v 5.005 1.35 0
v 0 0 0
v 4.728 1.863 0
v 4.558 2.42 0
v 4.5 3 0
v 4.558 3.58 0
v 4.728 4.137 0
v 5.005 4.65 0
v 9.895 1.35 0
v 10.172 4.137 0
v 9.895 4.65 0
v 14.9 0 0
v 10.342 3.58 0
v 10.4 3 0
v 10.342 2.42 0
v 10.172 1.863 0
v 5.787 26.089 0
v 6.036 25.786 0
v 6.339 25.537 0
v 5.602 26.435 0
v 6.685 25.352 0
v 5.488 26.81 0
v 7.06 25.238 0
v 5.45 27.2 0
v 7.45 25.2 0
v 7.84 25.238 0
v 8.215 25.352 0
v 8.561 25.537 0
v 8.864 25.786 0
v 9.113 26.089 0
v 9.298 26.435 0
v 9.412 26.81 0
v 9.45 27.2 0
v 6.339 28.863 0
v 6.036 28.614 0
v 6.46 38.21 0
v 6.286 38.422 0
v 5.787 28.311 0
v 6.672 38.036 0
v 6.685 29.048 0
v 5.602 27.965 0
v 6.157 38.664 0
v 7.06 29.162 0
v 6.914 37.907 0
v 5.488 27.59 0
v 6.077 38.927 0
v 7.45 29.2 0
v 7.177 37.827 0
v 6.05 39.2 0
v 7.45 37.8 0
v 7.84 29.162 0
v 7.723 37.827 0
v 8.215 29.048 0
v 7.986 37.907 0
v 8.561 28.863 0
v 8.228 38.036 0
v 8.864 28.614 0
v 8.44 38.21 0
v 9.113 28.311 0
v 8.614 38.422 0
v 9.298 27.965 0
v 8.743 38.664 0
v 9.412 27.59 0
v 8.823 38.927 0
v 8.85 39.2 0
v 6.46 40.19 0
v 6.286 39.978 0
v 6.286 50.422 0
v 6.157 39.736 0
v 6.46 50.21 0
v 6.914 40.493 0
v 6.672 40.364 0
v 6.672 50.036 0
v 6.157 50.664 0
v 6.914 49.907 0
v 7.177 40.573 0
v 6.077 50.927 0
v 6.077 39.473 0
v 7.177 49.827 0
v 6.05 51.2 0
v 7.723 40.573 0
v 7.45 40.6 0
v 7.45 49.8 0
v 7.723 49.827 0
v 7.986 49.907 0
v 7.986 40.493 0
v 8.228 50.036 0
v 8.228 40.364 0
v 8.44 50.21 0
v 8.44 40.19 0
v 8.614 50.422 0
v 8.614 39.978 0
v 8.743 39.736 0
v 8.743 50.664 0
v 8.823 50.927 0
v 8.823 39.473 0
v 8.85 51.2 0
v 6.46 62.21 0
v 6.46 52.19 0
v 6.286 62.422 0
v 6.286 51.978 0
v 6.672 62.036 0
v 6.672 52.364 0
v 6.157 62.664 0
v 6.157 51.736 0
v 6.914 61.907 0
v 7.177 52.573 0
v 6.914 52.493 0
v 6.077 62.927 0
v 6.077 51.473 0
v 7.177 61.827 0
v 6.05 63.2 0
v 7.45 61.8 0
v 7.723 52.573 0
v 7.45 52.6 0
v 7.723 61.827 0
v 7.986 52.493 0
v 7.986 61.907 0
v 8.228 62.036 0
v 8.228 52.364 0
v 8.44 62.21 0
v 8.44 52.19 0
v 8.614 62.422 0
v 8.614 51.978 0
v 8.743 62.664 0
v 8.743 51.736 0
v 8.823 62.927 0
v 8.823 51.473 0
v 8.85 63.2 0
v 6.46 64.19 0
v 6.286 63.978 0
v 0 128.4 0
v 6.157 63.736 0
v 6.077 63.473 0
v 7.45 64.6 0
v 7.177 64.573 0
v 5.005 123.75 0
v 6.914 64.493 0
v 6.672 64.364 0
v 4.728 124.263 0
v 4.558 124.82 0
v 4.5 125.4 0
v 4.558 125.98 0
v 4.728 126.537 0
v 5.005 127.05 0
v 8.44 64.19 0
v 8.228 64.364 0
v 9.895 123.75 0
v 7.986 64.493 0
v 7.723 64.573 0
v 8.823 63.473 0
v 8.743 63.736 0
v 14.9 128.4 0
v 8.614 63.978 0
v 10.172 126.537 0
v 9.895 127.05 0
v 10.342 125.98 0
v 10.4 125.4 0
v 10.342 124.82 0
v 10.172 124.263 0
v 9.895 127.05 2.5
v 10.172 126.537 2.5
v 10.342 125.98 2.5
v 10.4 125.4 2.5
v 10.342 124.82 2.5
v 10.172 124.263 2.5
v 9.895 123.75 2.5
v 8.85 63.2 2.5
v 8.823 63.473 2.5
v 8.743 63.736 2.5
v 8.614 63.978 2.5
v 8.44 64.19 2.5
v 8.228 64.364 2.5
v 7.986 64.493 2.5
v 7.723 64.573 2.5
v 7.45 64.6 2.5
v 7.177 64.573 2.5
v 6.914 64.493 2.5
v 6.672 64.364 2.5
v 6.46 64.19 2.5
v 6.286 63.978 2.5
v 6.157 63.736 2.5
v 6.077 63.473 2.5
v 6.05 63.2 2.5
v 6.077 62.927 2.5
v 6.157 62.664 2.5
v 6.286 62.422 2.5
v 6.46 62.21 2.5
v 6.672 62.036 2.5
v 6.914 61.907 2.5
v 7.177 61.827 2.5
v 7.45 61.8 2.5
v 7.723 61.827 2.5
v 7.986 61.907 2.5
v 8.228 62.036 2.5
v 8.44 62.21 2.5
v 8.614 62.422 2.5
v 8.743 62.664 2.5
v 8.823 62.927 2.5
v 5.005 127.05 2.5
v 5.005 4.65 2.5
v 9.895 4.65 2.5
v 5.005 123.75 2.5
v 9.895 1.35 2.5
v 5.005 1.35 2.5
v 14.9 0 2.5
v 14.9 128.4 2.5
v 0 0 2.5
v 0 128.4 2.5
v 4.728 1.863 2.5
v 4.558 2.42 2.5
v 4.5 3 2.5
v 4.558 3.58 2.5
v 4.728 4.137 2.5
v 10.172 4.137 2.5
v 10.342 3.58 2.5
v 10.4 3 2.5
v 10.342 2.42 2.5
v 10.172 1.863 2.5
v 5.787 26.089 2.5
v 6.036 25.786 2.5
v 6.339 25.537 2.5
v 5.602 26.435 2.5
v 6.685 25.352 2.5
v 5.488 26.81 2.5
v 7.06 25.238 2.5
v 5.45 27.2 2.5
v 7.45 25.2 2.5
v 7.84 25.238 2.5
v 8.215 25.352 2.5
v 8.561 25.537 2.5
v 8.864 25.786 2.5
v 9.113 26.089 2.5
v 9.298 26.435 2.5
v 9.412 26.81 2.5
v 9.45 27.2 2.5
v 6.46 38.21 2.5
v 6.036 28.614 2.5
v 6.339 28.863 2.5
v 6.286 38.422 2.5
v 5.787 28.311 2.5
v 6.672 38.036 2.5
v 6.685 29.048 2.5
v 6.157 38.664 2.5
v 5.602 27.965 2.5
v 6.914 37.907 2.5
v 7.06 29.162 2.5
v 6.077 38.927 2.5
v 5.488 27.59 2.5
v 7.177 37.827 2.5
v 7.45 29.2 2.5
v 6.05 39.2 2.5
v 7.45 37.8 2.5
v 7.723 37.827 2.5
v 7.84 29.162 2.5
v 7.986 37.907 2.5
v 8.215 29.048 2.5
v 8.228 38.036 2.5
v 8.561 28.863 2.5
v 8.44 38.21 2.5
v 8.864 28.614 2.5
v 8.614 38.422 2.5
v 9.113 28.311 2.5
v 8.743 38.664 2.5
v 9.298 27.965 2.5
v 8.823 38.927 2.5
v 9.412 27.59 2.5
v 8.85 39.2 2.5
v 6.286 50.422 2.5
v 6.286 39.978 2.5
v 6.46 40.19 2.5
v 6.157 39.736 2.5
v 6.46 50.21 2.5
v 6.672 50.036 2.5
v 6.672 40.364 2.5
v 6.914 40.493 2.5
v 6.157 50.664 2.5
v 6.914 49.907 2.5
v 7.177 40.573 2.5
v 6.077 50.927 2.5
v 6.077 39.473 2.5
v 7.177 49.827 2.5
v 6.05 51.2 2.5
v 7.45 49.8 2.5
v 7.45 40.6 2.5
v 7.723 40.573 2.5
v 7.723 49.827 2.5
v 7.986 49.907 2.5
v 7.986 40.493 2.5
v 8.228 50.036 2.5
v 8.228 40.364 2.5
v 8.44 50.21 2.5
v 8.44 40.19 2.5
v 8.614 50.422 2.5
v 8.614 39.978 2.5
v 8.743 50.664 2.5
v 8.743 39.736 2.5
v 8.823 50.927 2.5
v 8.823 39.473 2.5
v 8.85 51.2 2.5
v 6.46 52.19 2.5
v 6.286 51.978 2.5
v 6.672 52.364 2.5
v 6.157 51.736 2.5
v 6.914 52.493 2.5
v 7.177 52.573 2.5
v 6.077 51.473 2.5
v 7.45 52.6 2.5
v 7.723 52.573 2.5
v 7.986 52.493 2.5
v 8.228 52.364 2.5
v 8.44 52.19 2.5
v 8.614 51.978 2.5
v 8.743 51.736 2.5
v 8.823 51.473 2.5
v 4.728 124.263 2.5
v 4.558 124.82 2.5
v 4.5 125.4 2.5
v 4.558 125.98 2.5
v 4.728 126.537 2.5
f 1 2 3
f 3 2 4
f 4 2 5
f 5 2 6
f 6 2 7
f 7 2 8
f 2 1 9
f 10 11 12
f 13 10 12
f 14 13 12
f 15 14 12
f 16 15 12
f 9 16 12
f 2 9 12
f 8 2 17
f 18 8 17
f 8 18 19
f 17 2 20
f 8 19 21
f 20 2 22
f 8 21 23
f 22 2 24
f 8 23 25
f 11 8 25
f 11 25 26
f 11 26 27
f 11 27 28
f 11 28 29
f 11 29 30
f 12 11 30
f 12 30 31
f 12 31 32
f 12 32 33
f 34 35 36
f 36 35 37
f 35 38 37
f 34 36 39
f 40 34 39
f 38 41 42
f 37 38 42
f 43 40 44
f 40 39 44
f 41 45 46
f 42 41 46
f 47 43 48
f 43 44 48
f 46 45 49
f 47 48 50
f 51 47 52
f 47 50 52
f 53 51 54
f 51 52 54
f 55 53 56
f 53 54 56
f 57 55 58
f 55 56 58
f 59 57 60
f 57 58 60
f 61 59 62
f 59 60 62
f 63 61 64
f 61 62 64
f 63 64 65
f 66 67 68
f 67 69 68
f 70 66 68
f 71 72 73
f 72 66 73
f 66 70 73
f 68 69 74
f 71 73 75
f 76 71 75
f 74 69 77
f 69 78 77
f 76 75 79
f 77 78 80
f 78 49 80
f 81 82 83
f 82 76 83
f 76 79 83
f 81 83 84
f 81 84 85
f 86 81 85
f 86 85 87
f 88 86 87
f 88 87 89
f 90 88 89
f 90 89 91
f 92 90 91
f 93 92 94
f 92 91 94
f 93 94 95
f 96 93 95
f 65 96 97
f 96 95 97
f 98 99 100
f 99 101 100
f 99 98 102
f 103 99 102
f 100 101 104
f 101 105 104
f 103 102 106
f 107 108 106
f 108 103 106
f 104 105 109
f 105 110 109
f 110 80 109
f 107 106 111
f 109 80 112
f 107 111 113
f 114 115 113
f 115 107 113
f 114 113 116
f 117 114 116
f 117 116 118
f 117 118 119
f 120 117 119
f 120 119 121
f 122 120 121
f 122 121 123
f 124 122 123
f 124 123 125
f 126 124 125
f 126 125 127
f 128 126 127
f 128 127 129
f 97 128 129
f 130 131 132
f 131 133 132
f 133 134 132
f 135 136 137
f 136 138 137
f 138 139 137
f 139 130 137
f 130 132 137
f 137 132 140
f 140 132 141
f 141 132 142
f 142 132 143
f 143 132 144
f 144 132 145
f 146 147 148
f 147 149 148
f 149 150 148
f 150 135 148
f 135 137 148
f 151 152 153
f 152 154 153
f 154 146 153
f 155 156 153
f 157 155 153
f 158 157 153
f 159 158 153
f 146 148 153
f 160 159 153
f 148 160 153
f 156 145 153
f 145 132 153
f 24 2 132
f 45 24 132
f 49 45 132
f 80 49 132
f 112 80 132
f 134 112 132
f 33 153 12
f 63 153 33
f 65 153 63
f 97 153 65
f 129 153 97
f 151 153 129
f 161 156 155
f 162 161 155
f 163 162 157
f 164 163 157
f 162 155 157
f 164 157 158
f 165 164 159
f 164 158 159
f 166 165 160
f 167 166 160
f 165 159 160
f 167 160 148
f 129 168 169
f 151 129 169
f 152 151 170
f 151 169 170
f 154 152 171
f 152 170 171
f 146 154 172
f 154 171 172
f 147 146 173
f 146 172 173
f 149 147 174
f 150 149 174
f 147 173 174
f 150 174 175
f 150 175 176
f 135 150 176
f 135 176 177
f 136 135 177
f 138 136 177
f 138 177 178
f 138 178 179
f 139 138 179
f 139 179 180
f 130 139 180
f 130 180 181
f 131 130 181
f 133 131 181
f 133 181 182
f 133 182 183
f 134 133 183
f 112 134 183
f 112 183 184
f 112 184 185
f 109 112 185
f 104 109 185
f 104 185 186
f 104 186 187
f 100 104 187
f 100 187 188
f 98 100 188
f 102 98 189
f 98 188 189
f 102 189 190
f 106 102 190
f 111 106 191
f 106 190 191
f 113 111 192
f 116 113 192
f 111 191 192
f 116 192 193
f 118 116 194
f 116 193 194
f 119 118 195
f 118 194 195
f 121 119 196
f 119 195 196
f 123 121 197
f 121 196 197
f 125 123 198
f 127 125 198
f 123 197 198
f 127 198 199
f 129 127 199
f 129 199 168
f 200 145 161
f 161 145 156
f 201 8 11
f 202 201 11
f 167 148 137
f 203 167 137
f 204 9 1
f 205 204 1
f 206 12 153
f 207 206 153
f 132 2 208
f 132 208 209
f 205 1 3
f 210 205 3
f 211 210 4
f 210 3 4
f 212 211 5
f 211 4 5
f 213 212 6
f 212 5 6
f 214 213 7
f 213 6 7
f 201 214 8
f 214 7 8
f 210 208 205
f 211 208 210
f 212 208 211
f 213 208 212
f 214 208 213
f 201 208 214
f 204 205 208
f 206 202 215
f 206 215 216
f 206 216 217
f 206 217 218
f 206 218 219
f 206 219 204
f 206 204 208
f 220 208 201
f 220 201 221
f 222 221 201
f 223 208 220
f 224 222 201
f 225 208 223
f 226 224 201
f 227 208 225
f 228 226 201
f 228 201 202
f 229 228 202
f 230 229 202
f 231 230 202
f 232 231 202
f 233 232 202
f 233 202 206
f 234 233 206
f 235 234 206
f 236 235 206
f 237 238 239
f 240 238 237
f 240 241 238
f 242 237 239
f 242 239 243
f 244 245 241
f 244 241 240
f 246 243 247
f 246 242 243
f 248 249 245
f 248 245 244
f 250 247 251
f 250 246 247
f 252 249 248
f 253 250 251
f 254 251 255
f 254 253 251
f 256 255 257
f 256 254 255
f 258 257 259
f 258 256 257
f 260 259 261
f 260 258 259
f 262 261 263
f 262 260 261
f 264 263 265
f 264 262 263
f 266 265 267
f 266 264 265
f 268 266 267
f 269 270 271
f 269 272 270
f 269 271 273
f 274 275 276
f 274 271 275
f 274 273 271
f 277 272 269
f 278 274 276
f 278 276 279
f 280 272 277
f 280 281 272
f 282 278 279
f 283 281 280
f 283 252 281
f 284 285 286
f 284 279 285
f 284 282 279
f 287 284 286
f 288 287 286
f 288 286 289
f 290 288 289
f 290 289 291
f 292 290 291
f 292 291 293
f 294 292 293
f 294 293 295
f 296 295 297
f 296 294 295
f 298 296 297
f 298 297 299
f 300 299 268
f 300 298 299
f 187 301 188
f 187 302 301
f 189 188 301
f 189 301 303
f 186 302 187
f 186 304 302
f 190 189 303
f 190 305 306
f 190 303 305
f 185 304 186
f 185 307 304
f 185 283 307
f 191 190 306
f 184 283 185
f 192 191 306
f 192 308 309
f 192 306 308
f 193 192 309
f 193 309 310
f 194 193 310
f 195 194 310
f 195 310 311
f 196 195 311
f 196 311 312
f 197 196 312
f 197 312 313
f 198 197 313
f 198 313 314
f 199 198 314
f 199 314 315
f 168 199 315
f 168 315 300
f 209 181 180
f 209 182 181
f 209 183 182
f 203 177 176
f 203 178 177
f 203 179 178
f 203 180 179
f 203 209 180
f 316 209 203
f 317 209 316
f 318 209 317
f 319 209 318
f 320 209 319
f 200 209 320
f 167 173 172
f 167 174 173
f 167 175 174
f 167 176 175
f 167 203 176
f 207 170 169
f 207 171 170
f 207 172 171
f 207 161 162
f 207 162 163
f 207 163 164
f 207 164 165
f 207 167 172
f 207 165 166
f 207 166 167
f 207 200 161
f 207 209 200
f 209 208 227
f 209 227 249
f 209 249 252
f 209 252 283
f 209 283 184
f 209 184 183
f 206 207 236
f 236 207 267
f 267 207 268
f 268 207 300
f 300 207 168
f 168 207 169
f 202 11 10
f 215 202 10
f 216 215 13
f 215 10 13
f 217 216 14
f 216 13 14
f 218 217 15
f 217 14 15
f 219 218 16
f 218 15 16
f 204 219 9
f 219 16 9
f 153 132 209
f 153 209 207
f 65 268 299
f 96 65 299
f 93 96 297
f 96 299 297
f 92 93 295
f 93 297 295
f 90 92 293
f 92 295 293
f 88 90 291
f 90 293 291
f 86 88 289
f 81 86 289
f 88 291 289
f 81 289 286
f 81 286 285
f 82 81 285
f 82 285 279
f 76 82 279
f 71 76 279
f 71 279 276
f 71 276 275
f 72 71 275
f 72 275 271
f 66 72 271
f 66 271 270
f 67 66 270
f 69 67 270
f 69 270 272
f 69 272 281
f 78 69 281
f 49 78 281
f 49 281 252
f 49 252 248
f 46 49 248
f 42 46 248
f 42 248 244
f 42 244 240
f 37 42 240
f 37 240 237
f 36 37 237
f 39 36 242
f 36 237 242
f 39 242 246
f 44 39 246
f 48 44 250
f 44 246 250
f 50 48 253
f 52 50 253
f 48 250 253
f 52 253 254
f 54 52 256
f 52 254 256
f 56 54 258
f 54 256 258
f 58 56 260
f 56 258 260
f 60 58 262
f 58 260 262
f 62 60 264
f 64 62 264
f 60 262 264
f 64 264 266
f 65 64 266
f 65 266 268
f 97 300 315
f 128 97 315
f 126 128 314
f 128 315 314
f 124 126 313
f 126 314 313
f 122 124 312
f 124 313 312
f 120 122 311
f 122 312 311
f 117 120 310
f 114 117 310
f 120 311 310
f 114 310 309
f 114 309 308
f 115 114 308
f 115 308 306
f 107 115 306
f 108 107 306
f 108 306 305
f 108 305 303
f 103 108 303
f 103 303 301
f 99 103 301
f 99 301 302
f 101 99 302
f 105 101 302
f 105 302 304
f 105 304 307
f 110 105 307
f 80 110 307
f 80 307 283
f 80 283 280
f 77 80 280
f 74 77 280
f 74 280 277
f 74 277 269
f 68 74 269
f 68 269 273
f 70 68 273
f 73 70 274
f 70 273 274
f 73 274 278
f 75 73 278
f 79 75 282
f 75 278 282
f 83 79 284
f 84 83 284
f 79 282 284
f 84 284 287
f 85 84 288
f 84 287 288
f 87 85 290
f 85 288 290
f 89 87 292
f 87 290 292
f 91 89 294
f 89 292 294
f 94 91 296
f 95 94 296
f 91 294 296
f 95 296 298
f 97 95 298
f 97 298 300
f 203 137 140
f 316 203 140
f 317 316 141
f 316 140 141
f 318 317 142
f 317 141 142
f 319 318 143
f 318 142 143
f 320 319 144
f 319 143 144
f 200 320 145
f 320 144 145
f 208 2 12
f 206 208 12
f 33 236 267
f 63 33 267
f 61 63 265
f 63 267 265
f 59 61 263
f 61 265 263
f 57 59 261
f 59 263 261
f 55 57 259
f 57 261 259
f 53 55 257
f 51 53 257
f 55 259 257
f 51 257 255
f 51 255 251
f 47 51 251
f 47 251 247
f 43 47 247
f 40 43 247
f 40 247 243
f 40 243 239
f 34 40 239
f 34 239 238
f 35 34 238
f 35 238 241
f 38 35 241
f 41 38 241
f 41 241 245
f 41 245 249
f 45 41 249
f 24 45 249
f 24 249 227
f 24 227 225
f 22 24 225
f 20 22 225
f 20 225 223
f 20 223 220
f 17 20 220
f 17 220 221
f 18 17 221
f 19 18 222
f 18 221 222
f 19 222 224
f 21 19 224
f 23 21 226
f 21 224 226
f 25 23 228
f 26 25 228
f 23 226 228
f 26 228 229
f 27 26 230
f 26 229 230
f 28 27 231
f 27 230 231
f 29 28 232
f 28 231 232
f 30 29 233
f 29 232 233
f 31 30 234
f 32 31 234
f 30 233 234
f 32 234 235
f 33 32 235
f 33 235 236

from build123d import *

# Parameters (mm, degrees)
MODEL_W                 = 14.9
MODEL_H                 = 128.4
BOSS_EXTRU_1_DEPTH      = 2.5
ESQUISSE1_R             = 1.4
ESQUISSE1_R_2           = 2
ENL_V_MAT_EXTRU_1_DEPTH = 130.285807419


with BuildPart() as part:
    # Model → Boss.-Extru.1 (new body)
    with BuildSketch(Plane.XY):
        with Locations((7.45, 64.2)):
            Rectangle(MODEL_W, MODEL_H)
        with BuildLine():
            Line((9.895403852, 123.75), (5.004596148, 123.75))
            ThreePointArc((5.004596148, 123.75), (4.5, 125.4), (5.004596148, 127.05))
            Line((5.004596148, 127.05), (9.895403852, 127.05))
            ThreePointArc((9.895403852, 127.05), (10.4, 125.4), (9.895403852, 123.75))
        make_face(mode=Mode.SUBTRACT)
        with BuildLine():
            Line((9.895403852, 1.35), (5.004596148, 1.35))
            ThreePointArc((5.004596148, 1.35), (4.5, 3), (5.004596148, 4.65))
            Line((5.004596148, 4.65), (9.895403852, 4.65))
            ThreePointArc((9.895403852, 4.65), (10.4, 3), (9.895403852, 1.35))
        make_face(mode=Mode.SUBTRACT)
    extrude(amount=BOSS_EXTRU_1_DEPTH)

    # Esquisse1 → Enlèv. mat.-Extru.1 (cut, through all)
    with BuildSketch(Plane.XY.offset(2.5)):
        with Locations((7.45, 63.2)):
            Circle(ESQUISSE1_R)
        with Locations((7.45, 51.2)):
            Circle(ESQUISSE1_R)
        with Locations((7.45, 39.2)):
            Circle(ESQUISSE1_R)
        with Locations((7.45, 27.2)):
            Circle(ESQUISSE1_R_2)
    extrude(amount=-ENL_V_MAT_EXTRU_1_DEPTH, mode=Mode.SUBTRACT)


solid = part.part
